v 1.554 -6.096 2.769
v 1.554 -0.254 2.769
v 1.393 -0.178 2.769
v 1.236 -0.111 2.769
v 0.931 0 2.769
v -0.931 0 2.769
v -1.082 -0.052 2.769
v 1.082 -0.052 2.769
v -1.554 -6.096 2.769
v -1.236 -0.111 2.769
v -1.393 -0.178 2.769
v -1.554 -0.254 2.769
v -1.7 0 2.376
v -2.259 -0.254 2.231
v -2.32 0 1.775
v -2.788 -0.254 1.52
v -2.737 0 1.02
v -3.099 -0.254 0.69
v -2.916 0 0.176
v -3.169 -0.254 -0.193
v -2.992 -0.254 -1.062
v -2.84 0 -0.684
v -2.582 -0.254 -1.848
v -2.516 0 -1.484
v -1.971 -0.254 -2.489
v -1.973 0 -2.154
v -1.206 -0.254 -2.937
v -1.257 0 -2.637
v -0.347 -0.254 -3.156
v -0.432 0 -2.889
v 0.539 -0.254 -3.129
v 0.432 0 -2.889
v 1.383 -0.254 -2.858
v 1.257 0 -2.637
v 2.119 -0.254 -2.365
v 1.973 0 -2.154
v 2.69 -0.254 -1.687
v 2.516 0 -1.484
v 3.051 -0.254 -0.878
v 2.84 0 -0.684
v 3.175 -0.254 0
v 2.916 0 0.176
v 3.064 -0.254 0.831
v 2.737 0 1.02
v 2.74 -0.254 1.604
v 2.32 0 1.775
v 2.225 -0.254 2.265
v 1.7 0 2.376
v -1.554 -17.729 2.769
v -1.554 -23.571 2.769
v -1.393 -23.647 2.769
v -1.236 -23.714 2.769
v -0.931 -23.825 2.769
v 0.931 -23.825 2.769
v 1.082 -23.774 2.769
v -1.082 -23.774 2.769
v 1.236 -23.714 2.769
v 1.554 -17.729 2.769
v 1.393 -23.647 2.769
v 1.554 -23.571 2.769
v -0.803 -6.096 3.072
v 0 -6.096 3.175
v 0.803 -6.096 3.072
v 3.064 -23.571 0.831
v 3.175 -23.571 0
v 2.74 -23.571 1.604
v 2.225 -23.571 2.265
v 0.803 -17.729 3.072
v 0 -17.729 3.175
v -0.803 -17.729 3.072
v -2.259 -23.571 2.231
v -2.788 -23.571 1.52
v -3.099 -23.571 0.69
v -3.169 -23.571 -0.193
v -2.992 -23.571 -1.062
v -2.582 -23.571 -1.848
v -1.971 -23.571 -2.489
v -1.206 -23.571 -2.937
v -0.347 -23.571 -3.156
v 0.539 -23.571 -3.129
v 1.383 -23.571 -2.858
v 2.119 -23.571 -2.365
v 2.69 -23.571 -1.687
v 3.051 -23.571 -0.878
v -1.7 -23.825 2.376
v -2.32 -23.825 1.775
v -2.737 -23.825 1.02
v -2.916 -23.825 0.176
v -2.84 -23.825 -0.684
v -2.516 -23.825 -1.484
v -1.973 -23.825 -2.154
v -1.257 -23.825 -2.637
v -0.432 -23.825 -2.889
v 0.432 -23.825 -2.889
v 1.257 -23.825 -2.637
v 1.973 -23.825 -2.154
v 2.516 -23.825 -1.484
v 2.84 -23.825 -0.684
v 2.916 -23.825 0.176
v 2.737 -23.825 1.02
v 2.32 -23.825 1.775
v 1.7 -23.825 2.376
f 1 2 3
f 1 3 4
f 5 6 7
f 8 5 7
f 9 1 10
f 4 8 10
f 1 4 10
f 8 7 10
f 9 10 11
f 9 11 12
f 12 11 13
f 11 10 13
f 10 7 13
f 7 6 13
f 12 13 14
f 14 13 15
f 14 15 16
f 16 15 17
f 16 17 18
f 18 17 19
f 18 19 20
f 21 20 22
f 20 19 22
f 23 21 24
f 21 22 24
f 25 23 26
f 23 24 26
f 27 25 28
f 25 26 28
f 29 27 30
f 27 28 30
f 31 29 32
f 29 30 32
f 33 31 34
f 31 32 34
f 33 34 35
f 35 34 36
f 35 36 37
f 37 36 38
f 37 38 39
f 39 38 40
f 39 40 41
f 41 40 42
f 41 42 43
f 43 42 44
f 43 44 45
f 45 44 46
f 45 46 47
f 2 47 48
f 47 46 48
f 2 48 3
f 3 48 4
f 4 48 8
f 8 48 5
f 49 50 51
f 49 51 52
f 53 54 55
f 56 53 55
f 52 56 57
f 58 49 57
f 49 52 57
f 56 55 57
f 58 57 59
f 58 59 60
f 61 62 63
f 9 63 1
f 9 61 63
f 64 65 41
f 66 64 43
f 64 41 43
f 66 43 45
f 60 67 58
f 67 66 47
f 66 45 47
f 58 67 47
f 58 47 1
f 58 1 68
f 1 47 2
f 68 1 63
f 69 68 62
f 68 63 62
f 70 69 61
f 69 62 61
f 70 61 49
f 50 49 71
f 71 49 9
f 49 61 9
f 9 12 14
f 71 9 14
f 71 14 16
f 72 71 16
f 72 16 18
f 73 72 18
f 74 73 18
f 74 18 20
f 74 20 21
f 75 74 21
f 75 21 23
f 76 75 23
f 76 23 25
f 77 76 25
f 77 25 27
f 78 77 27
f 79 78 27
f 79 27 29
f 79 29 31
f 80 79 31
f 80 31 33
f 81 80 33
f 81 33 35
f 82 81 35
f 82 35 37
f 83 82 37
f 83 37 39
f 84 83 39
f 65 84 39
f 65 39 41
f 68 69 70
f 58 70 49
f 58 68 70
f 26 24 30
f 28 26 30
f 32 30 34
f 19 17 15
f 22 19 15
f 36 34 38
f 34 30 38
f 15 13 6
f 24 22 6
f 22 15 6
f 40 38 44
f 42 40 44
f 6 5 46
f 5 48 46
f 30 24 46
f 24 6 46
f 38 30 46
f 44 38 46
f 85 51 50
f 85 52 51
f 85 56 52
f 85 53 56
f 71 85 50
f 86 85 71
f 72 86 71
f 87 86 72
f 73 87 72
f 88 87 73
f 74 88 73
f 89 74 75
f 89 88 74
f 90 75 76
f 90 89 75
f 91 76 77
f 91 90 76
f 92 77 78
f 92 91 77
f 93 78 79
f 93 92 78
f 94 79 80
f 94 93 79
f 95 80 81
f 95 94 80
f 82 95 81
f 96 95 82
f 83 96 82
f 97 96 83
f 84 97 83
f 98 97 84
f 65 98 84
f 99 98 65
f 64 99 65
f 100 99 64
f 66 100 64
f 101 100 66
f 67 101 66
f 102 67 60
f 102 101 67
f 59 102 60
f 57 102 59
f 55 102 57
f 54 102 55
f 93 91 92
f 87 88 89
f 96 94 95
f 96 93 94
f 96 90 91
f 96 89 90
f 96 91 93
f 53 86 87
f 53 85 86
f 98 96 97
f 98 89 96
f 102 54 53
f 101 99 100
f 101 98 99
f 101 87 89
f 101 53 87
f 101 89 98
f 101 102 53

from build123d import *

# Parameters (mm, degrees)
F0_R     = 3.175
F1_DEPTH = 23.8252
F3_DEPTH = 6.096
F5_DEPTH = 6.096
F6_SIZE  = 0.254


with BuildPart() as f1:
    # F0 (on Front) → F1 (new body)
    with BuildSketch(Plane.XZ):
        Circle(F0_R)
    extrude(amount=F1_DEPTH)

    # F2 (on face) → F3 (cut)
    with BuildSketch(Plane(origin=(0, 0, 0), x_dir=(-1, 0, 0), z_dir=(0, 1, 0))):
        with BuildLine():
            ThreePointArc((1.554181, 2.7686), (0, 3.175), (-1.554181, 2.7686))
            Line((-1.554181, 2.7686), (1.554181, 2.7686))
        make_face()
    extrude(amount=-F3_DEPTH, mode=Mode.SUBTRACT)

    # F4 (on face) → F5 (cut)
    with BuildSketch(Plane.XZ.offset(23.8252)):
        with BuildLine():
            ThreePointArc((1.554181, 2.7686), (0, 3.175), (-1.554181, 2.7686))
            Line((-1.554181, 2.7686), (1.554181, 2.7686))
        make_face()
    extrude(amount=-F5_DEPTH, mode=Mode.SUBTRACT)

    # F6
    f6_edges = [f1.edges().sort_by_distance(p)[0] for p in [
        (-1.604073, 0, -2.739995),
        (-1.604073, -23.8252, -2.739995),
    ]]
    chamfer(f6_edges, length=F6_SIZE)


solid = f1.part
